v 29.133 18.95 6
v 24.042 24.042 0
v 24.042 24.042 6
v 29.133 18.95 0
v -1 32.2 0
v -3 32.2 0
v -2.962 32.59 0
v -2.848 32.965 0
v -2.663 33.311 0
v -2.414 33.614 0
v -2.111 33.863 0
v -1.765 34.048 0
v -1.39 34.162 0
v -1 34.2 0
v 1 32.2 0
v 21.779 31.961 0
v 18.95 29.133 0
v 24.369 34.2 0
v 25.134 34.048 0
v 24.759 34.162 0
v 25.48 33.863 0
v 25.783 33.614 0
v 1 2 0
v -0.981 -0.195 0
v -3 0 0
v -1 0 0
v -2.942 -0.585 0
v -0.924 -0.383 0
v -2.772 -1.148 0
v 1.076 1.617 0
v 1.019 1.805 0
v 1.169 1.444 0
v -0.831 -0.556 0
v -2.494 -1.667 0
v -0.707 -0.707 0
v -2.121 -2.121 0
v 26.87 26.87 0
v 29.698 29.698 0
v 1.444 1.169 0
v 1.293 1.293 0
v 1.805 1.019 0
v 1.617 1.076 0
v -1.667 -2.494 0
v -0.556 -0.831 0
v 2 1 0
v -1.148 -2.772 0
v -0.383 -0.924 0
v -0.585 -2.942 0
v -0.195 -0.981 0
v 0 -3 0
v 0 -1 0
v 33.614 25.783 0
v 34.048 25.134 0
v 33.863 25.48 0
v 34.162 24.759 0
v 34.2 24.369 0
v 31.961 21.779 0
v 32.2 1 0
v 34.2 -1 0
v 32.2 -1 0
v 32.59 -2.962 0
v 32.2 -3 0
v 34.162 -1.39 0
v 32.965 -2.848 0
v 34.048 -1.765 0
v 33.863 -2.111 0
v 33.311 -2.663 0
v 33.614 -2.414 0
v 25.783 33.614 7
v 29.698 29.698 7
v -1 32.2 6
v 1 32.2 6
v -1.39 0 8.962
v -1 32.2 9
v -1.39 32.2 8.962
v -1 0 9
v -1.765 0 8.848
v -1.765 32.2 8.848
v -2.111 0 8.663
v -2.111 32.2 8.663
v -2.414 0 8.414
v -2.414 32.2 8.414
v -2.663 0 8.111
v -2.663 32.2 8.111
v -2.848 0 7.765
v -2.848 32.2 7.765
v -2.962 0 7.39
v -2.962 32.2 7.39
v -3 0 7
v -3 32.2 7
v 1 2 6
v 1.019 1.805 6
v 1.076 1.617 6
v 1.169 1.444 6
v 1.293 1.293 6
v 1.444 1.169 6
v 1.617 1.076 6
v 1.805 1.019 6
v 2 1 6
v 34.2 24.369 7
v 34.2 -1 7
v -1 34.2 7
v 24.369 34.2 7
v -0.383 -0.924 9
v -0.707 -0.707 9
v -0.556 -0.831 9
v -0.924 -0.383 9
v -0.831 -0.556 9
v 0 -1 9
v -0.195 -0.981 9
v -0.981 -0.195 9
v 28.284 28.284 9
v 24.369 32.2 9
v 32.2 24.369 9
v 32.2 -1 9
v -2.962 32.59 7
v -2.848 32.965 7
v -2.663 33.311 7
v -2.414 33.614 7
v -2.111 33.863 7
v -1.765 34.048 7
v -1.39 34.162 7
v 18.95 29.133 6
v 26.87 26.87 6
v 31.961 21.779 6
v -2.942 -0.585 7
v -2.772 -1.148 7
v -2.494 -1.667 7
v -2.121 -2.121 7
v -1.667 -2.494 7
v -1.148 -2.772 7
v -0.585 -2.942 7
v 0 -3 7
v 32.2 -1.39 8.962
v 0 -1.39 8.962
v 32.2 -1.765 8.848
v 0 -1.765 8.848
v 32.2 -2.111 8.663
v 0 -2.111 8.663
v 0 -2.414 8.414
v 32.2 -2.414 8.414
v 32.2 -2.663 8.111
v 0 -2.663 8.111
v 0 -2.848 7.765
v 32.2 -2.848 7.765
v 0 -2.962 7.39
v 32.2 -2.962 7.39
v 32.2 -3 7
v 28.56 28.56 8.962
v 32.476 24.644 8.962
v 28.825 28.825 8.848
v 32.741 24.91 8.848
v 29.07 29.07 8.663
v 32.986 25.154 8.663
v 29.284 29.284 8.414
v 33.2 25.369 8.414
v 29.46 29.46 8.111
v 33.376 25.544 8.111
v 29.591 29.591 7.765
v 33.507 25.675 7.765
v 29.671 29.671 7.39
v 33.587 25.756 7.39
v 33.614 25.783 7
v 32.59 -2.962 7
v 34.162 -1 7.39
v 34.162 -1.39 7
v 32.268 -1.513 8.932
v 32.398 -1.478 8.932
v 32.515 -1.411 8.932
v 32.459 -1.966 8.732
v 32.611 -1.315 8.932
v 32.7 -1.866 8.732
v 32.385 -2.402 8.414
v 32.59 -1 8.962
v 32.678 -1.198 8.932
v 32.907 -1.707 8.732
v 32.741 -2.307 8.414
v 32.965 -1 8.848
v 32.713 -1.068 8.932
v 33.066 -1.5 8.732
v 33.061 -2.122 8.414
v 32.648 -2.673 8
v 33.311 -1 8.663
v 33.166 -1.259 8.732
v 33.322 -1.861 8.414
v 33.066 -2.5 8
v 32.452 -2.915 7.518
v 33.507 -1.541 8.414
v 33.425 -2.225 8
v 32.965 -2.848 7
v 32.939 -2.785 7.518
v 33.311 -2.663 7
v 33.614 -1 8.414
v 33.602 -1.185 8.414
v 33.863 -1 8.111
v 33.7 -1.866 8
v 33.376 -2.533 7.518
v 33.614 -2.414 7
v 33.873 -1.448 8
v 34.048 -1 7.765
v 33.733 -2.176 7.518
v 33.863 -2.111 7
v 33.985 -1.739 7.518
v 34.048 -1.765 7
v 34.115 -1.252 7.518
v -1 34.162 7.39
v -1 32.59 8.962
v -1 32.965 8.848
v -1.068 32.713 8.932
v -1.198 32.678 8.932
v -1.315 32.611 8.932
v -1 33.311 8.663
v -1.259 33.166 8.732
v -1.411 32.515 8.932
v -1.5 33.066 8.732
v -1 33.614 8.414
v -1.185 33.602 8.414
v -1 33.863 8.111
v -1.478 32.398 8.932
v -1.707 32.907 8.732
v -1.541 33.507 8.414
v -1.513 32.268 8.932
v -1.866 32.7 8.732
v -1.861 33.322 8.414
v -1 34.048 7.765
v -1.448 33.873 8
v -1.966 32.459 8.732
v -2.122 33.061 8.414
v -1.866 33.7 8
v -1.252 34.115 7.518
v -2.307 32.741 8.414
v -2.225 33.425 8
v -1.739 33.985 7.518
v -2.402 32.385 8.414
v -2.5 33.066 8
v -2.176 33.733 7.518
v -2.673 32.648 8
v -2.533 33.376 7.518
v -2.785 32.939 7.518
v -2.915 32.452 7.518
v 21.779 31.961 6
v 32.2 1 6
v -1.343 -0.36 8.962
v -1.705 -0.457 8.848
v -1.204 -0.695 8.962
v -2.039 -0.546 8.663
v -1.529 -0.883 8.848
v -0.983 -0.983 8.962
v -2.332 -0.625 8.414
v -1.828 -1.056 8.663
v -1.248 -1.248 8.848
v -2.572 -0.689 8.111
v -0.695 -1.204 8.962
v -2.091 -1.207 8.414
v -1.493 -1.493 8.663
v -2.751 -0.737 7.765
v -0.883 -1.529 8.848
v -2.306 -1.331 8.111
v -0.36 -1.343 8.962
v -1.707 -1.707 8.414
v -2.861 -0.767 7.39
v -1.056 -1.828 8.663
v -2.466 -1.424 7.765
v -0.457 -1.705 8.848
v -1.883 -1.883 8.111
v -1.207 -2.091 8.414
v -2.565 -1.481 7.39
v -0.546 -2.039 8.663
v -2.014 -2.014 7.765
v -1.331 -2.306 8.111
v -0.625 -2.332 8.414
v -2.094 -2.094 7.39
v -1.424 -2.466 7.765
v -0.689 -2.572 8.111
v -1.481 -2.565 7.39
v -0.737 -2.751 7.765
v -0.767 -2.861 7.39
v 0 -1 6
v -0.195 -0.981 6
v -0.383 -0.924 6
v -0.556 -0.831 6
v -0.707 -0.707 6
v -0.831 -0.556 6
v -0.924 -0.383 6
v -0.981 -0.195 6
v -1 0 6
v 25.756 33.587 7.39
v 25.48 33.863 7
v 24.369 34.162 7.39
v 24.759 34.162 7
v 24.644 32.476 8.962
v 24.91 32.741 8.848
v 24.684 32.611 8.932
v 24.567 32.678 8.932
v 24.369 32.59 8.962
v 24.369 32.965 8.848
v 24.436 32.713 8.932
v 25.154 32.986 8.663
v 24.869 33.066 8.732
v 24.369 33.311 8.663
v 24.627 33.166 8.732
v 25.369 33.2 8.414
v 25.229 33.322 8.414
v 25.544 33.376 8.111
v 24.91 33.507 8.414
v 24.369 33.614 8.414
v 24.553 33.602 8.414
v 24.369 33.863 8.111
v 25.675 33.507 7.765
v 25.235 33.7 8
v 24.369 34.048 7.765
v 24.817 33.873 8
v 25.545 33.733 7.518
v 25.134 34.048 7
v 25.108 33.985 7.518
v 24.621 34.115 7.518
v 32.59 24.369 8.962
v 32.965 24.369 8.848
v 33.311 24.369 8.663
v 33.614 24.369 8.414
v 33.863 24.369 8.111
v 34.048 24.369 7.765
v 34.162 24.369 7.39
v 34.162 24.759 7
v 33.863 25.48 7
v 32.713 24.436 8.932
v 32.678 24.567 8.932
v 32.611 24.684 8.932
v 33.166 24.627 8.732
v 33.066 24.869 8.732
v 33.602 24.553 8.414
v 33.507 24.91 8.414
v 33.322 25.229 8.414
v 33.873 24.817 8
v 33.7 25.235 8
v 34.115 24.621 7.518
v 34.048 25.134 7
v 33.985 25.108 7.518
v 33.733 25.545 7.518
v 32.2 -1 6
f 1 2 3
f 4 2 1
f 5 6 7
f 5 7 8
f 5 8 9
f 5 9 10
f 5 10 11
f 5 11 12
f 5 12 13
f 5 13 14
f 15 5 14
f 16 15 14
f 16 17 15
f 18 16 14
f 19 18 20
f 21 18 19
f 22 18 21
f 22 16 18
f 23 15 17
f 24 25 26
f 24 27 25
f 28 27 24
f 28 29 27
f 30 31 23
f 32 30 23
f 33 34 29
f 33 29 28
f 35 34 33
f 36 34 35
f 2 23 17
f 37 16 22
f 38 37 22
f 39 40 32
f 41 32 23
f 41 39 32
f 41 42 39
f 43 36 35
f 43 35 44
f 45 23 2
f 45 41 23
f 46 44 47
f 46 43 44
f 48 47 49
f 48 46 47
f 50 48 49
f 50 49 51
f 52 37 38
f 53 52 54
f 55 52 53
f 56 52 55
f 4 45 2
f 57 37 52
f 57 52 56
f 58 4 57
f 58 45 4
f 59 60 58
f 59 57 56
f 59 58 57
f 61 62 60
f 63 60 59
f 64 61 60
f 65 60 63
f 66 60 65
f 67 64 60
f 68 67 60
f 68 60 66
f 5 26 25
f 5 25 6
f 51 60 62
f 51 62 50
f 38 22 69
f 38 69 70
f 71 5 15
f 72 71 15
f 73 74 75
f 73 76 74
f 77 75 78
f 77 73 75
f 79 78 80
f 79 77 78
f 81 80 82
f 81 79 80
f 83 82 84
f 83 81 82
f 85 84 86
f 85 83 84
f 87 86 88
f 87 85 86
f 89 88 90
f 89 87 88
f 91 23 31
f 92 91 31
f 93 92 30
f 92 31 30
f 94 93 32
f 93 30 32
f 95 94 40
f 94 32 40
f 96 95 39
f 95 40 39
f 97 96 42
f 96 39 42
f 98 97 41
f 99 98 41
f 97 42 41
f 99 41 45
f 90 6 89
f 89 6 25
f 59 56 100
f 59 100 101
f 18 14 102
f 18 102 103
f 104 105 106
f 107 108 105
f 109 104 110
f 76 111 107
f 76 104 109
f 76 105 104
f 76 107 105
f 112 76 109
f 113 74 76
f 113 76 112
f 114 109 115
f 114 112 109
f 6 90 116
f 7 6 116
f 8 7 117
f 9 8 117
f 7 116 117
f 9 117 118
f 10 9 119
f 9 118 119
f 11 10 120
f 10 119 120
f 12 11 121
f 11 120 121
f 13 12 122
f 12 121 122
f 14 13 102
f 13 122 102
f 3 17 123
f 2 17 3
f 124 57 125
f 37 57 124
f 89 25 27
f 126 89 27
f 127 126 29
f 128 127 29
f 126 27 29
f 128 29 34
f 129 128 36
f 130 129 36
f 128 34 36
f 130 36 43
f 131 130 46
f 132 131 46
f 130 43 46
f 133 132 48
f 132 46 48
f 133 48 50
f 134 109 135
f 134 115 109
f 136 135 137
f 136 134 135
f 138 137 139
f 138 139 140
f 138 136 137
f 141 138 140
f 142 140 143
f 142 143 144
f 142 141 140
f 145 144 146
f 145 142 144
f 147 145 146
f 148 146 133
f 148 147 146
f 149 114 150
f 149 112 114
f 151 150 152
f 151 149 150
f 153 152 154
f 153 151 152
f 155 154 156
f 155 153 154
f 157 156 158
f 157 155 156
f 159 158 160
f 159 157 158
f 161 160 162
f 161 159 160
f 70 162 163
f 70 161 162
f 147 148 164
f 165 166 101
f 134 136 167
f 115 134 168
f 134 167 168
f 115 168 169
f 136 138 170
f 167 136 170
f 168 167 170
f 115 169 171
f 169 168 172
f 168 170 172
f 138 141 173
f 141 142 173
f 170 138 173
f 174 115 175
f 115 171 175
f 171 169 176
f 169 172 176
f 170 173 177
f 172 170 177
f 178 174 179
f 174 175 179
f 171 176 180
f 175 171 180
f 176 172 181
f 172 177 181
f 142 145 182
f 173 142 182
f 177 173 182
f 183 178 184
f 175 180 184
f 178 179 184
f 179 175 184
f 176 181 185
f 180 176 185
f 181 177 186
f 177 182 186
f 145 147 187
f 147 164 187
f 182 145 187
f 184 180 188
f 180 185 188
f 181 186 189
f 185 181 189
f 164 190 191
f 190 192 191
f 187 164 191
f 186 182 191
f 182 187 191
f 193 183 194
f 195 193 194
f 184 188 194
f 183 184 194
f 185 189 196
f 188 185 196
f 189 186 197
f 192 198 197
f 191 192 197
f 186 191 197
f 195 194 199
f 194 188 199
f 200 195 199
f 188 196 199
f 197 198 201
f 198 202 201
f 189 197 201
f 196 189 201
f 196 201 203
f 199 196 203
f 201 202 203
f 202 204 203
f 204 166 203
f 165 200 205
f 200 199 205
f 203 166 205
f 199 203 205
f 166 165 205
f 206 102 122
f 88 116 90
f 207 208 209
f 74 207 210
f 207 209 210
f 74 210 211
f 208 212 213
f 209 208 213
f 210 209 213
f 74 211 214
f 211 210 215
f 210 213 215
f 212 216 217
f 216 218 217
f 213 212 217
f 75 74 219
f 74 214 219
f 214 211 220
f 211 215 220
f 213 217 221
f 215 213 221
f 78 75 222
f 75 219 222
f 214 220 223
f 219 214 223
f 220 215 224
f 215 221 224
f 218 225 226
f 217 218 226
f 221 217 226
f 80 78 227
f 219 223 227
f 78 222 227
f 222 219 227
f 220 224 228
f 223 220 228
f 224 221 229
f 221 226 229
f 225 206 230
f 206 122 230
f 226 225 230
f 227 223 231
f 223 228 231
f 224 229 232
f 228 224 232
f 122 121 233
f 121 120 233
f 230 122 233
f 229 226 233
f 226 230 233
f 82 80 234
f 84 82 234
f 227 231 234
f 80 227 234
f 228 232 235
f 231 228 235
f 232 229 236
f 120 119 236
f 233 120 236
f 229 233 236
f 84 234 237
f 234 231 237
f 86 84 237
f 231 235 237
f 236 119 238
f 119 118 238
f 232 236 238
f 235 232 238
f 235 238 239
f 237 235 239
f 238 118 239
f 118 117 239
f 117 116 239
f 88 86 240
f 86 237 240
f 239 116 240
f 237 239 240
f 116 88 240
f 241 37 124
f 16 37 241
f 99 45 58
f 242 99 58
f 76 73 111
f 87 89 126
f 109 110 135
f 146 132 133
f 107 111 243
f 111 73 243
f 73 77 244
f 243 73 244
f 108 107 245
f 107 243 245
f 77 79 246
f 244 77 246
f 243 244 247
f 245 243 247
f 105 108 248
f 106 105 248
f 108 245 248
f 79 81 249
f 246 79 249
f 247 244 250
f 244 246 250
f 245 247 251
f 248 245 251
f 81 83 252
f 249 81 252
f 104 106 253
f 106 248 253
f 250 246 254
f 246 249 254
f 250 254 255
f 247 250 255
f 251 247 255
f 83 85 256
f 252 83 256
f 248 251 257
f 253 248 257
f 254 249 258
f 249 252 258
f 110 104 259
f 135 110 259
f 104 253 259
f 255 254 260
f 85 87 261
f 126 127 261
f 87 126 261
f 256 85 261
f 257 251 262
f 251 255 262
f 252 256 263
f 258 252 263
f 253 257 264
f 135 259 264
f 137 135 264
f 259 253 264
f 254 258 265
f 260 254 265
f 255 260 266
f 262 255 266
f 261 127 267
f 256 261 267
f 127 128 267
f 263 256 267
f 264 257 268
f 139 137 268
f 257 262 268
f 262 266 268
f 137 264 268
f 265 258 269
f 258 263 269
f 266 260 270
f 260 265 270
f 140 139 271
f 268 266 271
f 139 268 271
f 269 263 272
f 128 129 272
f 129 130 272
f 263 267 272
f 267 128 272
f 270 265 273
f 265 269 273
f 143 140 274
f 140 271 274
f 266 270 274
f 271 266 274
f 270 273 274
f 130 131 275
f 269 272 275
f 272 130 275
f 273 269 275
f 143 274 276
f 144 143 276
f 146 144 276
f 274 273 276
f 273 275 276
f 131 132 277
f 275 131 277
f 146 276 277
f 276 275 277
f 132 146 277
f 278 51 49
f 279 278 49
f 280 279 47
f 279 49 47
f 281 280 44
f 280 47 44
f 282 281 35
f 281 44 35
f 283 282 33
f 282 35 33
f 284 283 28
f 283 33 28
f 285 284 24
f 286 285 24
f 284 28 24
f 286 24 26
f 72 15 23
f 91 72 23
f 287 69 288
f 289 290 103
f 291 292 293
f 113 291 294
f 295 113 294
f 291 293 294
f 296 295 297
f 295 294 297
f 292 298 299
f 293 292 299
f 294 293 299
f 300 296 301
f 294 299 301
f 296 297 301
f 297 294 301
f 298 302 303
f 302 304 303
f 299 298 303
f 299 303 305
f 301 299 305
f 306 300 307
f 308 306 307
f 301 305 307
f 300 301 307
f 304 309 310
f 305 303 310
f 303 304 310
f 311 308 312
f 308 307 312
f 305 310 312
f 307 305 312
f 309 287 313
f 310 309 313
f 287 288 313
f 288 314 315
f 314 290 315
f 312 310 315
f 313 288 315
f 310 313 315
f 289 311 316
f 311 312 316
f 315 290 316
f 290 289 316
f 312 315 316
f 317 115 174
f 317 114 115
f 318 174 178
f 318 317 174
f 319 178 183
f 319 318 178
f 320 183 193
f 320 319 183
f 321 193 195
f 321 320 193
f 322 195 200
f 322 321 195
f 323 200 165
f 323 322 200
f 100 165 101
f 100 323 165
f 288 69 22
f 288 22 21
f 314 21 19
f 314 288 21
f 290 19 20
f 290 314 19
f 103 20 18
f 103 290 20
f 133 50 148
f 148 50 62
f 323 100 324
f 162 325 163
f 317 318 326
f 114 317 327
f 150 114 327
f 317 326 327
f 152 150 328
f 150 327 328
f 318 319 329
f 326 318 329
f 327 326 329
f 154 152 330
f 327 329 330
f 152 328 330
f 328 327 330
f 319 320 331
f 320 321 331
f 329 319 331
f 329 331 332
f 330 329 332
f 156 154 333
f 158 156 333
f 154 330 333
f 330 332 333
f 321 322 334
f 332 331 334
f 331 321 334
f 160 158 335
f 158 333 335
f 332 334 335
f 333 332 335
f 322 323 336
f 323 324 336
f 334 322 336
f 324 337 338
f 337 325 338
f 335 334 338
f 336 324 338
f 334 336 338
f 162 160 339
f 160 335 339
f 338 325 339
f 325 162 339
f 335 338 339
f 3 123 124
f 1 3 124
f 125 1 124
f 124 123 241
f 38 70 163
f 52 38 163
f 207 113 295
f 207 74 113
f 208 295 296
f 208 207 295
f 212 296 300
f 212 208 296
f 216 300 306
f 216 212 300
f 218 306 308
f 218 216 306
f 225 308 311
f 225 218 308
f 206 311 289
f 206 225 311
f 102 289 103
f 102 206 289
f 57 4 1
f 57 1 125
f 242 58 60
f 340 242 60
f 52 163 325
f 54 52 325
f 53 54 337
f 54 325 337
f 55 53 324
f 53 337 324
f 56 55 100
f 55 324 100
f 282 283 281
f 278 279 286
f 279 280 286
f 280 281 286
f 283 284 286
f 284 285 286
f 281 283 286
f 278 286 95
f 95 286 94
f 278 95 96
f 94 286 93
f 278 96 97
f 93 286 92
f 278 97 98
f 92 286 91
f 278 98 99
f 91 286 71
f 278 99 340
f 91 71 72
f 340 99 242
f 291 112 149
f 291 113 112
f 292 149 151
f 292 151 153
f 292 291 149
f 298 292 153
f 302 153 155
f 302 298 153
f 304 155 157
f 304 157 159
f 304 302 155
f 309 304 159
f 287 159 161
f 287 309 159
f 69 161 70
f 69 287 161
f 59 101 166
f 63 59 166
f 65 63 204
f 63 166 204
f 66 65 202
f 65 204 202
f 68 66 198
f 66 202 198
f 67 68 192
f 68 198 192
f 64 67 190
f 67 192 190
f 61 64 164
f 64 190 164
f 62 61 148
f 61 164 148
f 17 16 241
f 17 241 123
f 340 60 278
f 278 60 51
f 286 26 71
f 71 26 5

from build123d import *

# Parameters (mm, degrees)
F1_DEPTH = 6
F3_DEPTH = 3
F5_DEPTH = 9
F7_DEPTH = 3
F8_R     = 2
F9_R     = 2


with BuildPart() as f1:
    # F0 (on Top) → F1 (new body)
    with BuildSketch(Plane.XY):
        with BuildLine():
            Line((-3, 34.2), (-3, 0))
            ThreePointArc((-3, 0), (-2.1213203436, -2.1213203436), (0, -3))
            Line((0, -3), (34.2, -3))
            Line((34.2, -3), (34.2, 3))
            Line((34.2, 3), (5, 3))
            ThreePointArc((5, 3), (3.5857864376, 3.5857864376), (3, 5))
            Line((3, 5), (3, 34.2))
            Line((3, 34.2), (-3, 34.2))
        make_face()
        with BuildLine():
            Line((1, 32.2), (1, 2))
            ThreePointArc((1, 2), (1.2928932188, 1.2928932188), (2, 1))
            Line((2, 1), (32.2, 1))
            Line((32.2, 1), (32.2, -1))
            Line((32.2, -1), (0, -1))
            ThreePointArc((0, -1), (-0.7071067812, -0.7071067812), (-1, 0))
            Line((-1, 0), (-1, 32.2))
            Line((-1, 32.2), (1, 32.2))
        make_face(mode=Mode.SUBTRACT)
    extrude(amount=F1_DEPTH)

    # F2 (on face) → F3 (join)
    with BuildSketch(Plane.XY.offset(6)):
        with BuildLine():
            Line((3, 34.2), (-3, 34.2))
            Line((-3, 34.2), (-3, 0))
            ThreePointArc((-3, 0), (-2.1213203436, -2.1213203436), (0, -3))
            Line((0, -3), (34.2, -3))
            Line((34.2, -3), (34.2, 3))
            Line((34.2, 3), (5, 3))
            ThreePointArc((5, 3), (3.5857864376, 3.5857864376), (3, 5))
            Line((3, 5), (3, 34.2))
        make_face()
        with BuildLine():
            ThreePointArc((0, -1), (-0.7071067812, -0.7071067812), (-1, 0))
            Line((-1, 0), (-1, 32.2))
            Line((-1, 32.2), (1, 32.2))
            Line((1, 32.2), (1, 2))
            ThreePointArc((1, 2), (1.2928932188, 1.2928932188), (2, 1))
            Line((2, 1), (32.2, 1))
            Line((32.2, 1), (32.2, -1))
            Line((32.2, -1), (0, -1))
        make_face(mode=Mode.SUBTRACT)
        with BuildLine():
            Line((3, 34.2), (-3, 34.2))
            Line((-3, 34.2), (-3, 0))
            ThreePointArc((-3, 0), (-2.1213203436, -2.1213203436), (0, -3))
            Line((0, -3), (34.2, -3))
            Line((34.2, -3), (34.2, 3))
            Line((34.2, 3), (5, 3))
            ThreePointArc((5, 3), (3.5857864376, 3.5857864376), (3, 5))
            Line((3, 5), (3, 34.2))
        make_face()
        with BuildLine():
            Line((-1, 32.2), (-1, 0))
            ThreePointArc((-1, 0), (-0.7071067812, -0.7071067812), (0, -1))
            Line((0, -1), (32.2, -1))
            Line((32.2, -1), (32.2, 1))
            Line((32.2, 1), (2, 1))
            ThreePointArc((2, 1), (1.2928932188, 1.2928932188), (1, 2))
            Line((1, 2), (1, 32.2))
            Line((1, 32.2), (-1, 32.2))
        make_face()
    extrude(amount=F3_DEPTH)

    # F4 (on face) → F5 (join, through all)
    with BuildSketch(Plane(origin=(0, 0, 0), x_dir=(1, 0, 0), z_dir=(0, 0, -1))):
        with BuildLine():
            Line((3, -5), (3, -34.2))
            Line((3, -34.2), (25.1969696197, -34.2))
            Line((25.1969696197, -34.2), (29.6984848098, -29.6984848098))
            Line((29.6984848098, -29.6984848098), (34.2, -25.1969696197))
            Line((34.2, -25.1969696197), (34.2, -3))
            Line((34.2, -3), (5, -3))
            ThreePointArc((5, -3), (3.5857864376, -3.5857864376), (3, -5))
        make_face()
        Polygon((18.9504617358, -29.1327993849), (24.0416305603, -24.0416305603), (29.1327993849, -18.9504617358), (31.9612265096, -21.7788888605), (26.8700576851, -26.8700576851), (21.7788888605, -31.9612265096), align=None, mode=Mode.SUBTRACT)
    extrude(amount=-F5_DEPTH)

    # F6 (on face) → F7 (join)
    with BuildSketch(Plane.XY.offset(9)):
        Polygon((18.9504617358, 29.1327993849), (29.1327993849, 18.9504617358), (31.9612265096, 21.7788888605), (21.7788888605, 31.9612265096), align=None)
    extrude(amount=-F7_DEPTH)

    # F8
    f8_edges = [f1.edges().sort_by_distance(p)[0] for p in [
        (34.2, -3, 4.5),
        (34.2, 25.19697, 4.5),
        (25.19697, 34.2, 4.5),
        (-3, 34.2, 4.5),
    ]]
    fillet(f8_edges, radius=F8_R)

    # F9
    f9_edges = [f1.edges().sort_by_distance(p)[0] for p in [
        (16.1, -3, 9),
        (33.614214, -2.414214, 9),
        (-2.12132, -2.12132, 9),
        (34.2, 11.684271, 9),
        (-3, 16.1, 9),
        (34.047759, 25.133909, 9),
        (-2.414214, 33.614214, 9),
        (29.698485, 29.698485, 9),
        (11.684271, 34.2, 9),
        (25.133909, 34.047759, 9),
    ]]
    fillet(f9_edges, radius=F9_R)


solid = f1.part
